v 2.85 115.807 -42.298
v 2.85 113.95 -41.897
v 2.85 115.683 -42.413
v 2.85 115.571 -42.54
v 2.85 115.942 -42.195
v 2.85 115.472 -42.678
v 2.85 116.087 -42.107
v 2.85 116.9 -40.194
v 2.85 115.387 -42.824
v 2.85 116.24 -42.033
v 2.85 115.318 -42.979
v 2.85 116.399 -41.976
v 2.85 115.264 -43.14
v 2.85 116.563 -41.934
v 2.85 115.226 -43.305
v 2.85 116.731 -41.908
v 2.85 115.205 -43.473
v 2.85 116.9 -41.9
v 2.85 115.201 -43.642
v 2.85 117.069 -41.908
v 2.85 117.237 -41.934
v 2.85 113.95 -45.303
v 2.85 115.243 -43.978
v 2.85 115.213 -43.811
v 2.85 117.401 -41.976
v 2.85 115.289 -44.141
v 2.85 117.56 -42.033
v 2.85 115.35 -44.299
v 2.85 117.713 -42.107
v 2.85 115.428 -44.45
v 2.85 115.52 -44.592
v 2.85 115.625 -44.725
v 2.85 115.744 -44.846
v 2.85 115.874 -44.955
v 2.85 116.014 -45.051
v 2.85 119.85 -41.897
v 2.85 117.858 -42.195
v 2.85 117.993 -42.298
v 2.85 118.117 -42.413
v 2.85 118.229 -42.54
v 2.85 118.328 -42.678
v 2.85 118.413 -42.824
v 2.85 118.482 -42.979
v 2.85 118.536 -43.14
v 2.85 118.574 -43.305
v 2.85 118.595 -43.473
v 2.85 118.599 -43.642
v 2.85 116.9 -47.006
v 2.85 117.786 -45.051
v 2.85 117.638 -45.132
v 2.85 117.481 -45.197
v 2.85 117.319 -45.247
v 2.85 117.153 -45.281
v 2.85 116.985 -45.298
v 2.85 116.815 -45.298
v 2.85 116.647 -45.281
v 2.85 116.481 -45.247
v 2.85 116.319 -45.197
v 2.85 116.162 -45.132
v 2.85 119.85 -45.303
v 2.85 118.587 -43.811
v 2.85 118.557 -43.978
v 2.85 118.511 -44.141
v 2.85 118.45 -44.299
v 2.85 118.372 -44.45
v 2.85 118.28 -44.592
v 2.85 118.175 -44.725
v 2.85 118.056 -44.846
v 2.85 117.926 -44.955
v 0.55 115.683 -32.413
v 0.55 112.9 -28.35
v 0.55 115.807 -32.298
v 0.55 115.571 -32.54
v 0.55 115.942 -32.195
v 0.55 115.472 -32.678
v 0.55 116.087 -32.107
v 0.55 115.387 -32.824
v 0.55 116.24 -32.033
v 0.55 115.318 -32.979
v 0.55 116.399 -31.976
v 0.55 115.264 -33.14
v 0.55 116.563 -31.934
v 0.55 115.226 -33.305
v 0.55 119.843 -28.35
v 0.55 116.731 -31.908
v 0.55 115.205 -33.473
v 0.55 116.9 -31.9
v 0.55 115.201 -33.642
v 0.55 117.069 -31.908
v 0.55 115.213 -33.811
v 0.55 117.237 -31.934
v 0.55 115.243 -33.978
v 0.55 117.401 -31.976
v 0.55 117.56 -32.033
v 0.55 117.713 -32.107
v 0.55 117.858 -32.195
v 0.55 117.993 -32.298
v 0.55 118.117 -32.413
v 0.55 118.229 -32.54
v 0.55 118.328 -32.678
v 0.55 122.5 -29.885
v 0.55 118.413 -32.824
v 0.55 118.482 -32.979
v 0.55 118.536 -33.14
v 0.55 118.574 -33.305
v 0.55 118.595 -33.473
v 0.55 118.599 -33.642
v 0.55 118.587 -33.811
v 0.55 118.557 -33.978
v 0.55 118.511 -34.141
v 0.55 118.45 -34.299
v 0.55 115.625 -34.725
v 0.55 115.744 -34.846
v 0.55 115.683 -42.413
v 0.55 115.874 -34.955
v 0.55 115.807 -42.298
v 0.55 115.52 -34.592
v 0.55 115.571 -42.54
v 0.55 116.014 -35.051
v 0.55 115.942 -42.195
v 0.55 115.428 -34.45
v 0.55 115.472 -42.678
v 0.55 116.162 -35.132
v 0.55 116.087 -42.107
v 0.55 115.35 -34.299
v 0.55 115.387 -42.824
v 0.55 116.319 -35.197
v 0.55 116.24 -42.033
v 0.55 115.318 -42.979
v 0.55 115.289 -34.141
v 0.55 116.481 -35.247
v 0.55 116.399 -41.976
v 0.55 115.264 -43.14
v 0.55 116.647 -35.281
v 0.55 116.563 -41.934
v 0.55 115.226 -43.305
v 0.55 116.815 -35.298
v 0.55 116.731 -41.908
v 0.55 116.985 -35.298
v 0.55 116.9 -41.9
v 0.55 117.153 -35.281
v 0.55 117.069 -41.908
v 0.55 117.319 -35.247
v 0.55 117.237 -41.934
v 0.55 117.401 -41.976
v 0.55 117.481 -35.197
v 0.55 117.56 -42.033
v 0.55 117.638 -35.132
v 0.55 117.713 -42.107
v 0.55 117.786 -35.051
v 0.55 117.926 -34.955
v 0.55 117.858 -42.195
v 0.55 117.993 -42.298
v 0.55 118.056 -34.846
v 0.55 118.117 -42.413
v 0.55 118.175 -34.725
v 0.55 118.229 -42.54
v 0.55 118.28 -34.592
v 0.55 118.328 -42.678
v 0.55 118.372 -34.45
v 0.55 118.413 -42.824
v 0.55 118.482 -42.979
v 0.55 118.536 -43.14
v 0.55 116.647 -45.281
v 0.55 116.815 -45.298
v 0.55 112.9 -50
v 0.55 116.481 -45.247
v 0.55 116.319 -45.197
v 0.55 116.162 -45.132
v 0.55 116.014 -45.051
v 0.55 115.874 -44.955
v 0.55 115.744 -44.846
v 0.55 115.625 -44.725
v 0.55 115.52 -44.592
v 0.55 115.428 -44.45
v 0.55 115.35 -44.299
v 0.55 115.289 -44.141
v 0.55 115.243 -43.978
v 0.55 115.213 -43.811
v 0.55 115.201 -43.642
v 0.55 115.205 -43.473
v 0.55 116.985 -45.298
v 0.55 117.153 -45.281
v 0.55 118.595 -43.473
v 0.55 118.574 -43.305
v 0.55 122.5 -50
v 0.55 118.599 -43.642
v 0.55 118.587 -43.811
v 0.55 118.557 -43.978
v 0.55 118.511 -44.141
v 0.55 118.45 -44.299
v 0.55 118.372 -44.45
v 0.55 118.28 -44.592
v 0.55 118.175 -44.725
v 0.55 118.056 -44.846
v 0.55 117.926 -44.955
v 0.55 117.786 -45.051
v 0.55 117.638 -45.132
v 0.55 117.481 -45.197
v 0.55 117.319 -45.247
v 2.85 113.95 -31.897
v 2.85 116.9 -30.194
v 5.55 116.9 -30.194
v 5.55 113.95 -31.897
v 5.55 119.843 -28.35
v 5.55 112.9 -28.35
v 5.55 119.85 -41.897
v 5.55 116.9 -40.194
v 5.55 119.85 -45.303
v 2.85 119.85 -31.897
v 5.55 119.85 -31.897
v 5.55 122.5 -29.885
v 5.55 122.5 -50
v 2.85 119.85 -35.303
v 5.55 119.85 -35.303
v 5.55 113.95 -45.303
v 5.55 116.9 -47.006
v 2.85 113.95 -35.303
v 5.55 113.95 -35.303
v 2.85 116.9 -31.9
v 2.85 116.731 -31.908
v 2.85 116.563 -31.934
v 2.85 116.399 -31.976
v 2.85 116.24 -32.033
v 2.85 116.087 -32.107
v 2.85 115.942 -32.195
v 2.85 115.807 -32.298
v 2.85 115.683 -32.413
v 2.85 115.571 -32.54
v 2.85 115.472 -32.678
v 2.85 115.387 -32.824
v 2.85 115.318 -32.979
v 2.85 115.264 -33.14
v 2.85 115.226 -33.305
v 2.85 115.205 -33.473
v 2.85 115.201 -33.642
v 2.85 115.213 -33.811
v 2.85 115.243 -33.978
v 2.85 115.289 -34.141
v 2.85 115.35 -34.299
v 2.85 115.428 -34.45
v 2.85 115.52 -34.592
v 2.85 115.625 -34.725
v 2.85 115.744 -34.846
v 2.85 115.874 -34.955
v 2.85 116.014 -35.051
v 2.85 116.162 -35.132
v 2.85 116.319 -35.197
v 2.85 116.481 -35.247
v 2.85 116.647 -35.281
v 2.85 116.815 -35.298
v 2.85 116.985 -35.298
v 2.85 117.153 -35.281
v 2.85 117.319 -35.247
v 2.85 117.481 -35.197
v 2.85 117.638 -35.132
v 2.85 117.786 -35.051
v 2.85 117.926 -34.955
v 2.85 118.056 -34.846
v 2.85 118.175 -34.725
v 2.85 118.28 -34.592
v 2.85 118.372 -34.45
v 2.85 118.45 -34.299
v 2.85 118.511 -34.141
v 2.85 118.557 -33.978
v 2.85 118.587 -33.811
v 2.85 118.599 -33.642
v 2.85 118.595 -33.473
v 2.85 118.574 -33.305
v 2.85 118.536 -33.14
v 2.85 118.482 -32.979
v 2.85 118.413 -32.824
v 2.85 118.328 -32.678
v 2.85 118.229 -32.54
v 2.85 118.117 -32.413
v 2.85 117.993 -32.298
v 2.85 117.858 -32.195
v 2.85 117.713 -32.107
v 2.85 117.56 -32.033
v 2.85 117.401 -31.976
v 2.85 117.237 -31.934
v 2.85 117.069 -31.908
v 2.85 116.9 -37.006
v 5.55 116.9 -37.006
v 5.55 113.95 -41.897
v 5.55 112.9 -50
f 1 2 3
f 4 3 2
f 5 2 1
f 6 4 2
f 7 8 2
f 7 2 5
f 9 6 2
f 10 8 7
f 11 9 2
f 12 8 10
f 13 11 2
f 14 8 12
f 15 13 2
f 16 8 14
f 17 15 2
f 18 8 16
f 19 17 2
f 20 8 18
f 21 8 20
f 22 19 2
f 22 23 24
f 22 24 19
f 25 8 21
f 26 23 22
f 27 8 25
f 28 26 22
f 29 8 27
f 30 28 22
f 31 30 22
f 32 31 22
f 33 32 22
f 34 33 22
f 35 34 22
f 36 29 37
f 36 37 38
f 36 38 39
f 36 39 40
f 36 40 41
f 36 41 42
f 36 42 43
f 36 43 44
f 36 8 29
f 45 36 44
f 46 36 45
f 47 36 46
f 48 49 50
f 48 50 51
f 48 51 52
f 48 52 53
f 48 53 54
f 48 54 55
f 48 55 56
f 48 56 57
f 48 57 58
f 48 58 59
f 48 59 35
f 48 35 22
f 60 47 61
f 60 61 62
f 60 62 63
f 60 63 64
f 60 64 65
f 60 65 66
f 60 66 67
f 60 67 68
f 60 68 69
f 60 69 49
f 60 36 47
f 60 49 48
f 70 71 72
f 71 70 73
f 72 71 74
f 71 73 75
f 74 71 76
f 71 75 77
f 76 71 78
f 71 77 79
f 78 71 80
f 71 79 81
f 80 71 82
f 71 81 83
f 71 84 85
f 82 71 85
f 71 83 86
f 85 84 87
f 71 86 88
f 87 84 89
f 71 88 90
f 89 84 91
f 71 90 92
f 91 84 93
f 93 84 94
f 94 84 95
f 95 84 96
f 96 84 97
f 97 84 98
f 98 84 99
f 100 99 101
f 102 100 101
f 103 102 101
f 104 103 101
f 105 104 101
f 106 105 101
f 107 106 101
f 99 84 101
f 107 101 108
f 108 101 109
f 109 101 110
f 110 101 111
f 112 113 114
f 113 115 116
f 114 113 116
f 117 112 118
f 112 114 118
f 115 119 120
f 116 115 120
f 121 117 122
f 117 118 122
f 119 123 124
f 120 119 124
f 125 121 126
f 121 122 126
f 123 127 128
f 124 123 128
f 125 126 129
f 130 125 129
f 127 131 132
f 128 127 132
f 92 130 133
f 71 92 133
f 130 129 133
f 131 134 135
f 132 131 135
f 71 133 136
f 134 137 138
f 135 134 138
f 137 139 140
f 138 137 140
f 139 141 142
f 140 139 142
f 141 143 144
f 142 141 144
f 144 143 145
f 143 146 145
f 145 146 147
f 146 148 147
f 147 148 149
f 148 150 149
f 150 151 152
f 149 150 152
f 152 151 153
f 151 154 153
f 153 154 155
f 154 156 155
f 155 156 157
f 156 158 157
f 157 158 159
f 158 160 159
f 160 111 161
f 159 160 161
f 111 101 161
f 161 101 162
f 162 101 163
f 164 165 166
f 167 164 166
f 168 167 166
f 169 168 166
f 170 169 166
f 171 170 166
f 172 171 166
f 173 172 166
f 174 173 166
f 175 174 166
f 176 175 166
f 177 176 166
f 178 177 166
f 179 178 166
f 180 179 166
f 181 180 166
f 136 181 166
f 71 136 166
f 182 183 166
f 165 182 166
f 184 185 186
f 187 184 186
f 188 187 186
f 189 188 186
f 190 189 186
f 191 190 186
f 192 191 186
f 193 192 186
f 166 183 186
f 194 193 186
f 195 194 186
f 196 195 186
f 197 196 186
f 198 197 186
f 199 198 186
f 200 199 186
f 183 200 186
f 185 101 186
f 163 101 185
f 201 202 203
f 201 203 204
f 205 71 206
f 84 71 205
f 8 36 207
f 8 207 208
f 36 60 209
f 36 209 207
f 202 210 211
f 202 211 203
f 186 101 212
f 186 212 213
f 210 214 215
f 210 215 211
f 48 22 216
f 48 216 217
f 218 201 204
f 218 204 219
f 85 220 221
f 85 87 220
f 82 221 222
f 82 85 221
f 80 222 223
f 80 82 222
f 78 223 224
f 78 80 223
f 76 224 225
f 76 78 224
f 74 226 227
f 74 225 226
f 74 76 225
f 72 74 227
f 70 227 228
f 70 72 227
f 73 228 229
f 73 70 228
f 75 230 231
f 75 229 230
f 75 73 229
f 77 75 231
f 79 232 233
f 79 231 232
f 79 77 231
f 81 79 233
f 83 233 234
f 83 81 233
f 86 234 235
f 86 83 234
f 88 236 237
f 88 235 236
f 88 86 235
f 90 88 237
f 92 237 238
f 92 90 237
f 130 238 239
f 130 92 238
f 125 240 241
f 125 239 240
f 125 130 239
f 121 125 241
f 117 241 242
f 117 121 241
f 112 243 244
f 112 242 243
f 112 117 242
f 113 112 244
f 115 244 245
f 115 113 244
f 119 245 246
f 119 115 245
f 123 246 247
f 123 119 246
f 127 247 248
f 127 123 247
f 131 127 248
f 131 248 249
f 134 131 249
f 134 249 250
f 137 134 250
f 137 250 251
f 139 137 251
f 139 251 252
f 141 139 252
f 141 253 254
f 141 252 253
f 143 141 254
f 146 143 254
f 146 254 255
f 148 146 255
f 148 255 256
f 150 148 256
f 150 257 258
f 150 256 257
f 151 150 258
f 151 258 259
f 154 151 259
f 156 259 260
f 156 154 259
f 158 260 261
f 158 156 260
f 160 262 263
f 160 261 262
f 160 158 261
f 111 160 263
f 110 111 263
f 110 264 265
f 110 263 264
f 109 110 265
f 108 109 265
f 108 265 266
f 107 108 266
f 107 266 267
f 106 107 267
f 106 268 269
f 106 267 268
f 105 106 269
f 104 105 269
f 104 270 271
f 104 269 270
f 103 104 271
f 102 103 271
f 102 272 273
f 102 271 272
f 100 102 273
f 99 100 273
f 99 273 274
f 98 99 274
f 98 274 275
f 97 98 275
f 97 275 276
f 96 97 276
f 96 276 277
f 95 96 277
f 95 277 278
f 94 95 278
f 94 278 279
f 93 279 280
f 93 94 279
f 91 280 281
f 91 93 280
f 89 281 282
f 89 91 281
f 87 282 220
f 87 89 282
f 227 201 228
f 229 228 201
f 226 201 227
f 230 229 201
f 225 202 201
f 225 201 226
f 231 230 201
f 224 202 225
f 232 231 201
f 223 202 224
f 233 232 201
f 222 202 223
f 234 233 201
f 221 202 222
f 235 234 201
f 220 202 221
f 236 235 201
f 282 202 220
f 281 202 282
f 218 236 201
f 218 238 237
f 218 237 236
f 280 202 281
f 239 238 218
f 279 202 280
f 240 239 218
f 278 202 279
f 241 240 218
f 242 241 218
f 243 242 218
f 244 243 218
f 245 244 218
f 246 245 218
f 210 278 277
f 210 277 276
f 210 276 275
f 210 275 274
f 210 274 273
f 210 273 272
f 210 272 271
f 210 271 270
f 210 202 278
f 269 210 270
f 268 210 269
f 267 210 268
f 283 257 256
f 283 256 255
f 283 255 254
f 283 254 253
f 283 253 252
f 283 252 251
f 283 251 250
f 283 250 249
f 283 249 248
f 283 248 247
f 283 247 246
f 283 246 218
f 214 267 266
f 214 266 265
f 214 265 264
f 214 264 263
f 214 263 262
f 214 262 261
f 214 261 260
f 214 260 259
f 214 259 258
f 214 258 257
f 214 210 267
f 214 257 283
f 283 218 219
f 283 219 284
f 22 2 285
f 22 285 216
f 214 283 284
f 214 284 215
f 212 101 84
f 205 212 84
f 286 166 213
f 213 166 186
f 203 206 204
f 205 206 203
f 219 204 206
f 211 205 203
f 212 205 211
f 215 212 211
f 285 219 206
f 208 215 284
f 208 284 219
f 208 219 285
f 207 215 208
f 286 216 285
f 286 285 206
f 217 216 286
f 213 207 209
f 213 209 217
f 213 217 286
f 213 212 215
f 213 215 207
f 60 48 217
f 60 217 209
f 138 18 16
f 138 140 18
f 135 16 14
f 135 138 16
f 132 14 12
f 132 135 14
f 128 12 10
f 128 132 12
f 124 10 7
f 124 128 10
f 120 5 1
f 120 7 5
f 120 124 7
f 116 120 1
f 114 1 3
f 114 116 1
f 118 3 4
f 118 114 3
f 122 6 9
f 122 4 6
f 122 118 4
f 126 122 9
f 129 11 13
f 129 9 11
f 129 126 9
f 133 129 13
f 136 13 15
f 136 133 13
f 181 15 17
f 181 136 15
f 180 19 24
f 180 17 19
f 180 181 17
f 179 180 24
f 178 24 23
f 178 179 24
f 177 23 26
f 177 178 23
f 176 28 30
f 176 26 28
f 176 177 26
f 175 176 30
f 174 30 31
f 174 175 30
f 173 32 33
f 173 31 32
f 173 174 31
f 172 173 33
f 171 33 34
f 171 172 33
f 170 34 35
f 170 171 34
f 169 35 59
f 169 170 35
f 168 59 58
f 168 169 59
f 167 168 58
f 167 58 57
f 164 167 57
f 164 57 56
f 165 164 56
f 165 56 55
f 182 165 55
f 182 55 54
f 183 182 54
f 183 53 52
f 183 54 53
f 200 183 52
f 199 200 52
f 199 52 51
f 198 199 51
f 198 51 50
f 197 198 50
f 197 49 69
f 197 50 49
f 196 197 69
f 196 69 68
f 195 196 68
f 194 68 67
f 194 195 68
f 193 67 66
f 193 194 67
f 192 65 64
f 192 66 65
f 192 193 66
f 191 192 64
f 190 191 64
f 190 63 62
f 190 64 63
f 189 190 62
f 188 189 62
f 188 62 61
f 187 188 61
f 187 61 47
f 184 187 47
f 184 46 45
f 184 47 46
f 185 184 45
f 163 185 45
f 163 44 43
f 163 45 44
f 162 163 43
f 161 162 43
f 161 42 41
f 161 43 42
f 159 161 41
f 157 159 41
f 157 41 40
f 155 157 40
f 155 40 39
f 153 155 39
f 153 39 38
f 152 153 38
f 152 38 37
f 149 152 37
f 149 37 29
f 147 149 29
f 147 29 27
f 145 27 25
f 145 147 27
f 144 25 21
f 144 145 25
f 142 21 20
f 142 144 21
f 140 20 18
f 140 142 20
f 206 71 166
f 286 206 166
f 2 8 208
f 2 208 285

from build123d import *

# Parameters (mm, degrees)
KEEPER_START           = 0.55
SKETCH1_W              = 21.65
SKETCH1_H              = 9.6
KEEPER_DEPTH           = 5
BULKHEAD_START         = 0.35
BULKHEAD_CHAMFER_DEPTH = 5.4
TAB_START              = 0.35
SKETCH3_R              = 1.7
TAB_BOLT_HOLES_DEPTH   = 5.4
TAB_START_2            = 2.85
TAB_NUT_POCKETS_DEPTH  = 2.9


with BuildPart() as part:
    # Sketch1 → Keeper (new body)
    with BuildSketch(Plane(origin=(0, 0, 0), x_dir=(0, 0, -1), z_dir=(1, 0, 0)).offset(KEEPER_START)):
        with Locations((39.175, 117.7)):
            Rectangle(SKETCH1_W, SKETCH1_H)
    extrude(amount=KEEPER_DEPTH)

    # Sketch2 → Bulkhead chamfer (cut)
    with BuildSketch(Plane(origin=(0, 0, 0), x_dir=(0, 0, -1), z_dir=(1, 0, 0)).offset(BULKHEAD_START)):
        Polygon((21.8, 108.5), (21.8, 122.7), (30, 122.7), align=None)
    extrude(amount=BULKHEAD_CHAMFER_DEPTH, mode=Mode.SUBTRACT)

    # Sketch3 → Tab bolt holes (cut)
    with BuildSketch(Plane(origin=(0, 0, 0), x_dir=(0, 0, -1), z_dir=(1, 0, 0)).offset(TAB_START)):
        with Locations(Location((33.6, 116.9, 0), (0, 0, 180))):
            Circle(SKETCH3_R)
        with Locations(Location((43.6, 116.9, 0), (0, 0, 180))):
            Circle(SKETCH3_R)
    extrude(amount=TAB_BOLT_HOLES_DEPTH, mode=Mode.SUBTRACT)

    # Sketch4 → Tab nut pockets (cut)
    with BuildSketch(Plane(origin=(0, 0, 0), x_dir=(0, 0, -1), z_dir=(1, 0, 0)).offset(TAB_START_2)):
        Polygon((31.896816706, 119.85), (30.193633412, 116.9), (31.896816706, 113.95), (35.303183294, 113.95), (37.006366588, 116.9), (35.303183294, 119.85), align=None)
        Polygon((41.896816706, 119.85), (40.193633412, 116.9), (41.896816706, 113.95), (45.303183294, 113.95), (47.006366588, 116.9), (45.303183294, 119.85), align=None)
    extrude(amount=TAB_NUT_POCKETS_DEPTH, mode=Mode.SUBTRACT)


solid = part.part
